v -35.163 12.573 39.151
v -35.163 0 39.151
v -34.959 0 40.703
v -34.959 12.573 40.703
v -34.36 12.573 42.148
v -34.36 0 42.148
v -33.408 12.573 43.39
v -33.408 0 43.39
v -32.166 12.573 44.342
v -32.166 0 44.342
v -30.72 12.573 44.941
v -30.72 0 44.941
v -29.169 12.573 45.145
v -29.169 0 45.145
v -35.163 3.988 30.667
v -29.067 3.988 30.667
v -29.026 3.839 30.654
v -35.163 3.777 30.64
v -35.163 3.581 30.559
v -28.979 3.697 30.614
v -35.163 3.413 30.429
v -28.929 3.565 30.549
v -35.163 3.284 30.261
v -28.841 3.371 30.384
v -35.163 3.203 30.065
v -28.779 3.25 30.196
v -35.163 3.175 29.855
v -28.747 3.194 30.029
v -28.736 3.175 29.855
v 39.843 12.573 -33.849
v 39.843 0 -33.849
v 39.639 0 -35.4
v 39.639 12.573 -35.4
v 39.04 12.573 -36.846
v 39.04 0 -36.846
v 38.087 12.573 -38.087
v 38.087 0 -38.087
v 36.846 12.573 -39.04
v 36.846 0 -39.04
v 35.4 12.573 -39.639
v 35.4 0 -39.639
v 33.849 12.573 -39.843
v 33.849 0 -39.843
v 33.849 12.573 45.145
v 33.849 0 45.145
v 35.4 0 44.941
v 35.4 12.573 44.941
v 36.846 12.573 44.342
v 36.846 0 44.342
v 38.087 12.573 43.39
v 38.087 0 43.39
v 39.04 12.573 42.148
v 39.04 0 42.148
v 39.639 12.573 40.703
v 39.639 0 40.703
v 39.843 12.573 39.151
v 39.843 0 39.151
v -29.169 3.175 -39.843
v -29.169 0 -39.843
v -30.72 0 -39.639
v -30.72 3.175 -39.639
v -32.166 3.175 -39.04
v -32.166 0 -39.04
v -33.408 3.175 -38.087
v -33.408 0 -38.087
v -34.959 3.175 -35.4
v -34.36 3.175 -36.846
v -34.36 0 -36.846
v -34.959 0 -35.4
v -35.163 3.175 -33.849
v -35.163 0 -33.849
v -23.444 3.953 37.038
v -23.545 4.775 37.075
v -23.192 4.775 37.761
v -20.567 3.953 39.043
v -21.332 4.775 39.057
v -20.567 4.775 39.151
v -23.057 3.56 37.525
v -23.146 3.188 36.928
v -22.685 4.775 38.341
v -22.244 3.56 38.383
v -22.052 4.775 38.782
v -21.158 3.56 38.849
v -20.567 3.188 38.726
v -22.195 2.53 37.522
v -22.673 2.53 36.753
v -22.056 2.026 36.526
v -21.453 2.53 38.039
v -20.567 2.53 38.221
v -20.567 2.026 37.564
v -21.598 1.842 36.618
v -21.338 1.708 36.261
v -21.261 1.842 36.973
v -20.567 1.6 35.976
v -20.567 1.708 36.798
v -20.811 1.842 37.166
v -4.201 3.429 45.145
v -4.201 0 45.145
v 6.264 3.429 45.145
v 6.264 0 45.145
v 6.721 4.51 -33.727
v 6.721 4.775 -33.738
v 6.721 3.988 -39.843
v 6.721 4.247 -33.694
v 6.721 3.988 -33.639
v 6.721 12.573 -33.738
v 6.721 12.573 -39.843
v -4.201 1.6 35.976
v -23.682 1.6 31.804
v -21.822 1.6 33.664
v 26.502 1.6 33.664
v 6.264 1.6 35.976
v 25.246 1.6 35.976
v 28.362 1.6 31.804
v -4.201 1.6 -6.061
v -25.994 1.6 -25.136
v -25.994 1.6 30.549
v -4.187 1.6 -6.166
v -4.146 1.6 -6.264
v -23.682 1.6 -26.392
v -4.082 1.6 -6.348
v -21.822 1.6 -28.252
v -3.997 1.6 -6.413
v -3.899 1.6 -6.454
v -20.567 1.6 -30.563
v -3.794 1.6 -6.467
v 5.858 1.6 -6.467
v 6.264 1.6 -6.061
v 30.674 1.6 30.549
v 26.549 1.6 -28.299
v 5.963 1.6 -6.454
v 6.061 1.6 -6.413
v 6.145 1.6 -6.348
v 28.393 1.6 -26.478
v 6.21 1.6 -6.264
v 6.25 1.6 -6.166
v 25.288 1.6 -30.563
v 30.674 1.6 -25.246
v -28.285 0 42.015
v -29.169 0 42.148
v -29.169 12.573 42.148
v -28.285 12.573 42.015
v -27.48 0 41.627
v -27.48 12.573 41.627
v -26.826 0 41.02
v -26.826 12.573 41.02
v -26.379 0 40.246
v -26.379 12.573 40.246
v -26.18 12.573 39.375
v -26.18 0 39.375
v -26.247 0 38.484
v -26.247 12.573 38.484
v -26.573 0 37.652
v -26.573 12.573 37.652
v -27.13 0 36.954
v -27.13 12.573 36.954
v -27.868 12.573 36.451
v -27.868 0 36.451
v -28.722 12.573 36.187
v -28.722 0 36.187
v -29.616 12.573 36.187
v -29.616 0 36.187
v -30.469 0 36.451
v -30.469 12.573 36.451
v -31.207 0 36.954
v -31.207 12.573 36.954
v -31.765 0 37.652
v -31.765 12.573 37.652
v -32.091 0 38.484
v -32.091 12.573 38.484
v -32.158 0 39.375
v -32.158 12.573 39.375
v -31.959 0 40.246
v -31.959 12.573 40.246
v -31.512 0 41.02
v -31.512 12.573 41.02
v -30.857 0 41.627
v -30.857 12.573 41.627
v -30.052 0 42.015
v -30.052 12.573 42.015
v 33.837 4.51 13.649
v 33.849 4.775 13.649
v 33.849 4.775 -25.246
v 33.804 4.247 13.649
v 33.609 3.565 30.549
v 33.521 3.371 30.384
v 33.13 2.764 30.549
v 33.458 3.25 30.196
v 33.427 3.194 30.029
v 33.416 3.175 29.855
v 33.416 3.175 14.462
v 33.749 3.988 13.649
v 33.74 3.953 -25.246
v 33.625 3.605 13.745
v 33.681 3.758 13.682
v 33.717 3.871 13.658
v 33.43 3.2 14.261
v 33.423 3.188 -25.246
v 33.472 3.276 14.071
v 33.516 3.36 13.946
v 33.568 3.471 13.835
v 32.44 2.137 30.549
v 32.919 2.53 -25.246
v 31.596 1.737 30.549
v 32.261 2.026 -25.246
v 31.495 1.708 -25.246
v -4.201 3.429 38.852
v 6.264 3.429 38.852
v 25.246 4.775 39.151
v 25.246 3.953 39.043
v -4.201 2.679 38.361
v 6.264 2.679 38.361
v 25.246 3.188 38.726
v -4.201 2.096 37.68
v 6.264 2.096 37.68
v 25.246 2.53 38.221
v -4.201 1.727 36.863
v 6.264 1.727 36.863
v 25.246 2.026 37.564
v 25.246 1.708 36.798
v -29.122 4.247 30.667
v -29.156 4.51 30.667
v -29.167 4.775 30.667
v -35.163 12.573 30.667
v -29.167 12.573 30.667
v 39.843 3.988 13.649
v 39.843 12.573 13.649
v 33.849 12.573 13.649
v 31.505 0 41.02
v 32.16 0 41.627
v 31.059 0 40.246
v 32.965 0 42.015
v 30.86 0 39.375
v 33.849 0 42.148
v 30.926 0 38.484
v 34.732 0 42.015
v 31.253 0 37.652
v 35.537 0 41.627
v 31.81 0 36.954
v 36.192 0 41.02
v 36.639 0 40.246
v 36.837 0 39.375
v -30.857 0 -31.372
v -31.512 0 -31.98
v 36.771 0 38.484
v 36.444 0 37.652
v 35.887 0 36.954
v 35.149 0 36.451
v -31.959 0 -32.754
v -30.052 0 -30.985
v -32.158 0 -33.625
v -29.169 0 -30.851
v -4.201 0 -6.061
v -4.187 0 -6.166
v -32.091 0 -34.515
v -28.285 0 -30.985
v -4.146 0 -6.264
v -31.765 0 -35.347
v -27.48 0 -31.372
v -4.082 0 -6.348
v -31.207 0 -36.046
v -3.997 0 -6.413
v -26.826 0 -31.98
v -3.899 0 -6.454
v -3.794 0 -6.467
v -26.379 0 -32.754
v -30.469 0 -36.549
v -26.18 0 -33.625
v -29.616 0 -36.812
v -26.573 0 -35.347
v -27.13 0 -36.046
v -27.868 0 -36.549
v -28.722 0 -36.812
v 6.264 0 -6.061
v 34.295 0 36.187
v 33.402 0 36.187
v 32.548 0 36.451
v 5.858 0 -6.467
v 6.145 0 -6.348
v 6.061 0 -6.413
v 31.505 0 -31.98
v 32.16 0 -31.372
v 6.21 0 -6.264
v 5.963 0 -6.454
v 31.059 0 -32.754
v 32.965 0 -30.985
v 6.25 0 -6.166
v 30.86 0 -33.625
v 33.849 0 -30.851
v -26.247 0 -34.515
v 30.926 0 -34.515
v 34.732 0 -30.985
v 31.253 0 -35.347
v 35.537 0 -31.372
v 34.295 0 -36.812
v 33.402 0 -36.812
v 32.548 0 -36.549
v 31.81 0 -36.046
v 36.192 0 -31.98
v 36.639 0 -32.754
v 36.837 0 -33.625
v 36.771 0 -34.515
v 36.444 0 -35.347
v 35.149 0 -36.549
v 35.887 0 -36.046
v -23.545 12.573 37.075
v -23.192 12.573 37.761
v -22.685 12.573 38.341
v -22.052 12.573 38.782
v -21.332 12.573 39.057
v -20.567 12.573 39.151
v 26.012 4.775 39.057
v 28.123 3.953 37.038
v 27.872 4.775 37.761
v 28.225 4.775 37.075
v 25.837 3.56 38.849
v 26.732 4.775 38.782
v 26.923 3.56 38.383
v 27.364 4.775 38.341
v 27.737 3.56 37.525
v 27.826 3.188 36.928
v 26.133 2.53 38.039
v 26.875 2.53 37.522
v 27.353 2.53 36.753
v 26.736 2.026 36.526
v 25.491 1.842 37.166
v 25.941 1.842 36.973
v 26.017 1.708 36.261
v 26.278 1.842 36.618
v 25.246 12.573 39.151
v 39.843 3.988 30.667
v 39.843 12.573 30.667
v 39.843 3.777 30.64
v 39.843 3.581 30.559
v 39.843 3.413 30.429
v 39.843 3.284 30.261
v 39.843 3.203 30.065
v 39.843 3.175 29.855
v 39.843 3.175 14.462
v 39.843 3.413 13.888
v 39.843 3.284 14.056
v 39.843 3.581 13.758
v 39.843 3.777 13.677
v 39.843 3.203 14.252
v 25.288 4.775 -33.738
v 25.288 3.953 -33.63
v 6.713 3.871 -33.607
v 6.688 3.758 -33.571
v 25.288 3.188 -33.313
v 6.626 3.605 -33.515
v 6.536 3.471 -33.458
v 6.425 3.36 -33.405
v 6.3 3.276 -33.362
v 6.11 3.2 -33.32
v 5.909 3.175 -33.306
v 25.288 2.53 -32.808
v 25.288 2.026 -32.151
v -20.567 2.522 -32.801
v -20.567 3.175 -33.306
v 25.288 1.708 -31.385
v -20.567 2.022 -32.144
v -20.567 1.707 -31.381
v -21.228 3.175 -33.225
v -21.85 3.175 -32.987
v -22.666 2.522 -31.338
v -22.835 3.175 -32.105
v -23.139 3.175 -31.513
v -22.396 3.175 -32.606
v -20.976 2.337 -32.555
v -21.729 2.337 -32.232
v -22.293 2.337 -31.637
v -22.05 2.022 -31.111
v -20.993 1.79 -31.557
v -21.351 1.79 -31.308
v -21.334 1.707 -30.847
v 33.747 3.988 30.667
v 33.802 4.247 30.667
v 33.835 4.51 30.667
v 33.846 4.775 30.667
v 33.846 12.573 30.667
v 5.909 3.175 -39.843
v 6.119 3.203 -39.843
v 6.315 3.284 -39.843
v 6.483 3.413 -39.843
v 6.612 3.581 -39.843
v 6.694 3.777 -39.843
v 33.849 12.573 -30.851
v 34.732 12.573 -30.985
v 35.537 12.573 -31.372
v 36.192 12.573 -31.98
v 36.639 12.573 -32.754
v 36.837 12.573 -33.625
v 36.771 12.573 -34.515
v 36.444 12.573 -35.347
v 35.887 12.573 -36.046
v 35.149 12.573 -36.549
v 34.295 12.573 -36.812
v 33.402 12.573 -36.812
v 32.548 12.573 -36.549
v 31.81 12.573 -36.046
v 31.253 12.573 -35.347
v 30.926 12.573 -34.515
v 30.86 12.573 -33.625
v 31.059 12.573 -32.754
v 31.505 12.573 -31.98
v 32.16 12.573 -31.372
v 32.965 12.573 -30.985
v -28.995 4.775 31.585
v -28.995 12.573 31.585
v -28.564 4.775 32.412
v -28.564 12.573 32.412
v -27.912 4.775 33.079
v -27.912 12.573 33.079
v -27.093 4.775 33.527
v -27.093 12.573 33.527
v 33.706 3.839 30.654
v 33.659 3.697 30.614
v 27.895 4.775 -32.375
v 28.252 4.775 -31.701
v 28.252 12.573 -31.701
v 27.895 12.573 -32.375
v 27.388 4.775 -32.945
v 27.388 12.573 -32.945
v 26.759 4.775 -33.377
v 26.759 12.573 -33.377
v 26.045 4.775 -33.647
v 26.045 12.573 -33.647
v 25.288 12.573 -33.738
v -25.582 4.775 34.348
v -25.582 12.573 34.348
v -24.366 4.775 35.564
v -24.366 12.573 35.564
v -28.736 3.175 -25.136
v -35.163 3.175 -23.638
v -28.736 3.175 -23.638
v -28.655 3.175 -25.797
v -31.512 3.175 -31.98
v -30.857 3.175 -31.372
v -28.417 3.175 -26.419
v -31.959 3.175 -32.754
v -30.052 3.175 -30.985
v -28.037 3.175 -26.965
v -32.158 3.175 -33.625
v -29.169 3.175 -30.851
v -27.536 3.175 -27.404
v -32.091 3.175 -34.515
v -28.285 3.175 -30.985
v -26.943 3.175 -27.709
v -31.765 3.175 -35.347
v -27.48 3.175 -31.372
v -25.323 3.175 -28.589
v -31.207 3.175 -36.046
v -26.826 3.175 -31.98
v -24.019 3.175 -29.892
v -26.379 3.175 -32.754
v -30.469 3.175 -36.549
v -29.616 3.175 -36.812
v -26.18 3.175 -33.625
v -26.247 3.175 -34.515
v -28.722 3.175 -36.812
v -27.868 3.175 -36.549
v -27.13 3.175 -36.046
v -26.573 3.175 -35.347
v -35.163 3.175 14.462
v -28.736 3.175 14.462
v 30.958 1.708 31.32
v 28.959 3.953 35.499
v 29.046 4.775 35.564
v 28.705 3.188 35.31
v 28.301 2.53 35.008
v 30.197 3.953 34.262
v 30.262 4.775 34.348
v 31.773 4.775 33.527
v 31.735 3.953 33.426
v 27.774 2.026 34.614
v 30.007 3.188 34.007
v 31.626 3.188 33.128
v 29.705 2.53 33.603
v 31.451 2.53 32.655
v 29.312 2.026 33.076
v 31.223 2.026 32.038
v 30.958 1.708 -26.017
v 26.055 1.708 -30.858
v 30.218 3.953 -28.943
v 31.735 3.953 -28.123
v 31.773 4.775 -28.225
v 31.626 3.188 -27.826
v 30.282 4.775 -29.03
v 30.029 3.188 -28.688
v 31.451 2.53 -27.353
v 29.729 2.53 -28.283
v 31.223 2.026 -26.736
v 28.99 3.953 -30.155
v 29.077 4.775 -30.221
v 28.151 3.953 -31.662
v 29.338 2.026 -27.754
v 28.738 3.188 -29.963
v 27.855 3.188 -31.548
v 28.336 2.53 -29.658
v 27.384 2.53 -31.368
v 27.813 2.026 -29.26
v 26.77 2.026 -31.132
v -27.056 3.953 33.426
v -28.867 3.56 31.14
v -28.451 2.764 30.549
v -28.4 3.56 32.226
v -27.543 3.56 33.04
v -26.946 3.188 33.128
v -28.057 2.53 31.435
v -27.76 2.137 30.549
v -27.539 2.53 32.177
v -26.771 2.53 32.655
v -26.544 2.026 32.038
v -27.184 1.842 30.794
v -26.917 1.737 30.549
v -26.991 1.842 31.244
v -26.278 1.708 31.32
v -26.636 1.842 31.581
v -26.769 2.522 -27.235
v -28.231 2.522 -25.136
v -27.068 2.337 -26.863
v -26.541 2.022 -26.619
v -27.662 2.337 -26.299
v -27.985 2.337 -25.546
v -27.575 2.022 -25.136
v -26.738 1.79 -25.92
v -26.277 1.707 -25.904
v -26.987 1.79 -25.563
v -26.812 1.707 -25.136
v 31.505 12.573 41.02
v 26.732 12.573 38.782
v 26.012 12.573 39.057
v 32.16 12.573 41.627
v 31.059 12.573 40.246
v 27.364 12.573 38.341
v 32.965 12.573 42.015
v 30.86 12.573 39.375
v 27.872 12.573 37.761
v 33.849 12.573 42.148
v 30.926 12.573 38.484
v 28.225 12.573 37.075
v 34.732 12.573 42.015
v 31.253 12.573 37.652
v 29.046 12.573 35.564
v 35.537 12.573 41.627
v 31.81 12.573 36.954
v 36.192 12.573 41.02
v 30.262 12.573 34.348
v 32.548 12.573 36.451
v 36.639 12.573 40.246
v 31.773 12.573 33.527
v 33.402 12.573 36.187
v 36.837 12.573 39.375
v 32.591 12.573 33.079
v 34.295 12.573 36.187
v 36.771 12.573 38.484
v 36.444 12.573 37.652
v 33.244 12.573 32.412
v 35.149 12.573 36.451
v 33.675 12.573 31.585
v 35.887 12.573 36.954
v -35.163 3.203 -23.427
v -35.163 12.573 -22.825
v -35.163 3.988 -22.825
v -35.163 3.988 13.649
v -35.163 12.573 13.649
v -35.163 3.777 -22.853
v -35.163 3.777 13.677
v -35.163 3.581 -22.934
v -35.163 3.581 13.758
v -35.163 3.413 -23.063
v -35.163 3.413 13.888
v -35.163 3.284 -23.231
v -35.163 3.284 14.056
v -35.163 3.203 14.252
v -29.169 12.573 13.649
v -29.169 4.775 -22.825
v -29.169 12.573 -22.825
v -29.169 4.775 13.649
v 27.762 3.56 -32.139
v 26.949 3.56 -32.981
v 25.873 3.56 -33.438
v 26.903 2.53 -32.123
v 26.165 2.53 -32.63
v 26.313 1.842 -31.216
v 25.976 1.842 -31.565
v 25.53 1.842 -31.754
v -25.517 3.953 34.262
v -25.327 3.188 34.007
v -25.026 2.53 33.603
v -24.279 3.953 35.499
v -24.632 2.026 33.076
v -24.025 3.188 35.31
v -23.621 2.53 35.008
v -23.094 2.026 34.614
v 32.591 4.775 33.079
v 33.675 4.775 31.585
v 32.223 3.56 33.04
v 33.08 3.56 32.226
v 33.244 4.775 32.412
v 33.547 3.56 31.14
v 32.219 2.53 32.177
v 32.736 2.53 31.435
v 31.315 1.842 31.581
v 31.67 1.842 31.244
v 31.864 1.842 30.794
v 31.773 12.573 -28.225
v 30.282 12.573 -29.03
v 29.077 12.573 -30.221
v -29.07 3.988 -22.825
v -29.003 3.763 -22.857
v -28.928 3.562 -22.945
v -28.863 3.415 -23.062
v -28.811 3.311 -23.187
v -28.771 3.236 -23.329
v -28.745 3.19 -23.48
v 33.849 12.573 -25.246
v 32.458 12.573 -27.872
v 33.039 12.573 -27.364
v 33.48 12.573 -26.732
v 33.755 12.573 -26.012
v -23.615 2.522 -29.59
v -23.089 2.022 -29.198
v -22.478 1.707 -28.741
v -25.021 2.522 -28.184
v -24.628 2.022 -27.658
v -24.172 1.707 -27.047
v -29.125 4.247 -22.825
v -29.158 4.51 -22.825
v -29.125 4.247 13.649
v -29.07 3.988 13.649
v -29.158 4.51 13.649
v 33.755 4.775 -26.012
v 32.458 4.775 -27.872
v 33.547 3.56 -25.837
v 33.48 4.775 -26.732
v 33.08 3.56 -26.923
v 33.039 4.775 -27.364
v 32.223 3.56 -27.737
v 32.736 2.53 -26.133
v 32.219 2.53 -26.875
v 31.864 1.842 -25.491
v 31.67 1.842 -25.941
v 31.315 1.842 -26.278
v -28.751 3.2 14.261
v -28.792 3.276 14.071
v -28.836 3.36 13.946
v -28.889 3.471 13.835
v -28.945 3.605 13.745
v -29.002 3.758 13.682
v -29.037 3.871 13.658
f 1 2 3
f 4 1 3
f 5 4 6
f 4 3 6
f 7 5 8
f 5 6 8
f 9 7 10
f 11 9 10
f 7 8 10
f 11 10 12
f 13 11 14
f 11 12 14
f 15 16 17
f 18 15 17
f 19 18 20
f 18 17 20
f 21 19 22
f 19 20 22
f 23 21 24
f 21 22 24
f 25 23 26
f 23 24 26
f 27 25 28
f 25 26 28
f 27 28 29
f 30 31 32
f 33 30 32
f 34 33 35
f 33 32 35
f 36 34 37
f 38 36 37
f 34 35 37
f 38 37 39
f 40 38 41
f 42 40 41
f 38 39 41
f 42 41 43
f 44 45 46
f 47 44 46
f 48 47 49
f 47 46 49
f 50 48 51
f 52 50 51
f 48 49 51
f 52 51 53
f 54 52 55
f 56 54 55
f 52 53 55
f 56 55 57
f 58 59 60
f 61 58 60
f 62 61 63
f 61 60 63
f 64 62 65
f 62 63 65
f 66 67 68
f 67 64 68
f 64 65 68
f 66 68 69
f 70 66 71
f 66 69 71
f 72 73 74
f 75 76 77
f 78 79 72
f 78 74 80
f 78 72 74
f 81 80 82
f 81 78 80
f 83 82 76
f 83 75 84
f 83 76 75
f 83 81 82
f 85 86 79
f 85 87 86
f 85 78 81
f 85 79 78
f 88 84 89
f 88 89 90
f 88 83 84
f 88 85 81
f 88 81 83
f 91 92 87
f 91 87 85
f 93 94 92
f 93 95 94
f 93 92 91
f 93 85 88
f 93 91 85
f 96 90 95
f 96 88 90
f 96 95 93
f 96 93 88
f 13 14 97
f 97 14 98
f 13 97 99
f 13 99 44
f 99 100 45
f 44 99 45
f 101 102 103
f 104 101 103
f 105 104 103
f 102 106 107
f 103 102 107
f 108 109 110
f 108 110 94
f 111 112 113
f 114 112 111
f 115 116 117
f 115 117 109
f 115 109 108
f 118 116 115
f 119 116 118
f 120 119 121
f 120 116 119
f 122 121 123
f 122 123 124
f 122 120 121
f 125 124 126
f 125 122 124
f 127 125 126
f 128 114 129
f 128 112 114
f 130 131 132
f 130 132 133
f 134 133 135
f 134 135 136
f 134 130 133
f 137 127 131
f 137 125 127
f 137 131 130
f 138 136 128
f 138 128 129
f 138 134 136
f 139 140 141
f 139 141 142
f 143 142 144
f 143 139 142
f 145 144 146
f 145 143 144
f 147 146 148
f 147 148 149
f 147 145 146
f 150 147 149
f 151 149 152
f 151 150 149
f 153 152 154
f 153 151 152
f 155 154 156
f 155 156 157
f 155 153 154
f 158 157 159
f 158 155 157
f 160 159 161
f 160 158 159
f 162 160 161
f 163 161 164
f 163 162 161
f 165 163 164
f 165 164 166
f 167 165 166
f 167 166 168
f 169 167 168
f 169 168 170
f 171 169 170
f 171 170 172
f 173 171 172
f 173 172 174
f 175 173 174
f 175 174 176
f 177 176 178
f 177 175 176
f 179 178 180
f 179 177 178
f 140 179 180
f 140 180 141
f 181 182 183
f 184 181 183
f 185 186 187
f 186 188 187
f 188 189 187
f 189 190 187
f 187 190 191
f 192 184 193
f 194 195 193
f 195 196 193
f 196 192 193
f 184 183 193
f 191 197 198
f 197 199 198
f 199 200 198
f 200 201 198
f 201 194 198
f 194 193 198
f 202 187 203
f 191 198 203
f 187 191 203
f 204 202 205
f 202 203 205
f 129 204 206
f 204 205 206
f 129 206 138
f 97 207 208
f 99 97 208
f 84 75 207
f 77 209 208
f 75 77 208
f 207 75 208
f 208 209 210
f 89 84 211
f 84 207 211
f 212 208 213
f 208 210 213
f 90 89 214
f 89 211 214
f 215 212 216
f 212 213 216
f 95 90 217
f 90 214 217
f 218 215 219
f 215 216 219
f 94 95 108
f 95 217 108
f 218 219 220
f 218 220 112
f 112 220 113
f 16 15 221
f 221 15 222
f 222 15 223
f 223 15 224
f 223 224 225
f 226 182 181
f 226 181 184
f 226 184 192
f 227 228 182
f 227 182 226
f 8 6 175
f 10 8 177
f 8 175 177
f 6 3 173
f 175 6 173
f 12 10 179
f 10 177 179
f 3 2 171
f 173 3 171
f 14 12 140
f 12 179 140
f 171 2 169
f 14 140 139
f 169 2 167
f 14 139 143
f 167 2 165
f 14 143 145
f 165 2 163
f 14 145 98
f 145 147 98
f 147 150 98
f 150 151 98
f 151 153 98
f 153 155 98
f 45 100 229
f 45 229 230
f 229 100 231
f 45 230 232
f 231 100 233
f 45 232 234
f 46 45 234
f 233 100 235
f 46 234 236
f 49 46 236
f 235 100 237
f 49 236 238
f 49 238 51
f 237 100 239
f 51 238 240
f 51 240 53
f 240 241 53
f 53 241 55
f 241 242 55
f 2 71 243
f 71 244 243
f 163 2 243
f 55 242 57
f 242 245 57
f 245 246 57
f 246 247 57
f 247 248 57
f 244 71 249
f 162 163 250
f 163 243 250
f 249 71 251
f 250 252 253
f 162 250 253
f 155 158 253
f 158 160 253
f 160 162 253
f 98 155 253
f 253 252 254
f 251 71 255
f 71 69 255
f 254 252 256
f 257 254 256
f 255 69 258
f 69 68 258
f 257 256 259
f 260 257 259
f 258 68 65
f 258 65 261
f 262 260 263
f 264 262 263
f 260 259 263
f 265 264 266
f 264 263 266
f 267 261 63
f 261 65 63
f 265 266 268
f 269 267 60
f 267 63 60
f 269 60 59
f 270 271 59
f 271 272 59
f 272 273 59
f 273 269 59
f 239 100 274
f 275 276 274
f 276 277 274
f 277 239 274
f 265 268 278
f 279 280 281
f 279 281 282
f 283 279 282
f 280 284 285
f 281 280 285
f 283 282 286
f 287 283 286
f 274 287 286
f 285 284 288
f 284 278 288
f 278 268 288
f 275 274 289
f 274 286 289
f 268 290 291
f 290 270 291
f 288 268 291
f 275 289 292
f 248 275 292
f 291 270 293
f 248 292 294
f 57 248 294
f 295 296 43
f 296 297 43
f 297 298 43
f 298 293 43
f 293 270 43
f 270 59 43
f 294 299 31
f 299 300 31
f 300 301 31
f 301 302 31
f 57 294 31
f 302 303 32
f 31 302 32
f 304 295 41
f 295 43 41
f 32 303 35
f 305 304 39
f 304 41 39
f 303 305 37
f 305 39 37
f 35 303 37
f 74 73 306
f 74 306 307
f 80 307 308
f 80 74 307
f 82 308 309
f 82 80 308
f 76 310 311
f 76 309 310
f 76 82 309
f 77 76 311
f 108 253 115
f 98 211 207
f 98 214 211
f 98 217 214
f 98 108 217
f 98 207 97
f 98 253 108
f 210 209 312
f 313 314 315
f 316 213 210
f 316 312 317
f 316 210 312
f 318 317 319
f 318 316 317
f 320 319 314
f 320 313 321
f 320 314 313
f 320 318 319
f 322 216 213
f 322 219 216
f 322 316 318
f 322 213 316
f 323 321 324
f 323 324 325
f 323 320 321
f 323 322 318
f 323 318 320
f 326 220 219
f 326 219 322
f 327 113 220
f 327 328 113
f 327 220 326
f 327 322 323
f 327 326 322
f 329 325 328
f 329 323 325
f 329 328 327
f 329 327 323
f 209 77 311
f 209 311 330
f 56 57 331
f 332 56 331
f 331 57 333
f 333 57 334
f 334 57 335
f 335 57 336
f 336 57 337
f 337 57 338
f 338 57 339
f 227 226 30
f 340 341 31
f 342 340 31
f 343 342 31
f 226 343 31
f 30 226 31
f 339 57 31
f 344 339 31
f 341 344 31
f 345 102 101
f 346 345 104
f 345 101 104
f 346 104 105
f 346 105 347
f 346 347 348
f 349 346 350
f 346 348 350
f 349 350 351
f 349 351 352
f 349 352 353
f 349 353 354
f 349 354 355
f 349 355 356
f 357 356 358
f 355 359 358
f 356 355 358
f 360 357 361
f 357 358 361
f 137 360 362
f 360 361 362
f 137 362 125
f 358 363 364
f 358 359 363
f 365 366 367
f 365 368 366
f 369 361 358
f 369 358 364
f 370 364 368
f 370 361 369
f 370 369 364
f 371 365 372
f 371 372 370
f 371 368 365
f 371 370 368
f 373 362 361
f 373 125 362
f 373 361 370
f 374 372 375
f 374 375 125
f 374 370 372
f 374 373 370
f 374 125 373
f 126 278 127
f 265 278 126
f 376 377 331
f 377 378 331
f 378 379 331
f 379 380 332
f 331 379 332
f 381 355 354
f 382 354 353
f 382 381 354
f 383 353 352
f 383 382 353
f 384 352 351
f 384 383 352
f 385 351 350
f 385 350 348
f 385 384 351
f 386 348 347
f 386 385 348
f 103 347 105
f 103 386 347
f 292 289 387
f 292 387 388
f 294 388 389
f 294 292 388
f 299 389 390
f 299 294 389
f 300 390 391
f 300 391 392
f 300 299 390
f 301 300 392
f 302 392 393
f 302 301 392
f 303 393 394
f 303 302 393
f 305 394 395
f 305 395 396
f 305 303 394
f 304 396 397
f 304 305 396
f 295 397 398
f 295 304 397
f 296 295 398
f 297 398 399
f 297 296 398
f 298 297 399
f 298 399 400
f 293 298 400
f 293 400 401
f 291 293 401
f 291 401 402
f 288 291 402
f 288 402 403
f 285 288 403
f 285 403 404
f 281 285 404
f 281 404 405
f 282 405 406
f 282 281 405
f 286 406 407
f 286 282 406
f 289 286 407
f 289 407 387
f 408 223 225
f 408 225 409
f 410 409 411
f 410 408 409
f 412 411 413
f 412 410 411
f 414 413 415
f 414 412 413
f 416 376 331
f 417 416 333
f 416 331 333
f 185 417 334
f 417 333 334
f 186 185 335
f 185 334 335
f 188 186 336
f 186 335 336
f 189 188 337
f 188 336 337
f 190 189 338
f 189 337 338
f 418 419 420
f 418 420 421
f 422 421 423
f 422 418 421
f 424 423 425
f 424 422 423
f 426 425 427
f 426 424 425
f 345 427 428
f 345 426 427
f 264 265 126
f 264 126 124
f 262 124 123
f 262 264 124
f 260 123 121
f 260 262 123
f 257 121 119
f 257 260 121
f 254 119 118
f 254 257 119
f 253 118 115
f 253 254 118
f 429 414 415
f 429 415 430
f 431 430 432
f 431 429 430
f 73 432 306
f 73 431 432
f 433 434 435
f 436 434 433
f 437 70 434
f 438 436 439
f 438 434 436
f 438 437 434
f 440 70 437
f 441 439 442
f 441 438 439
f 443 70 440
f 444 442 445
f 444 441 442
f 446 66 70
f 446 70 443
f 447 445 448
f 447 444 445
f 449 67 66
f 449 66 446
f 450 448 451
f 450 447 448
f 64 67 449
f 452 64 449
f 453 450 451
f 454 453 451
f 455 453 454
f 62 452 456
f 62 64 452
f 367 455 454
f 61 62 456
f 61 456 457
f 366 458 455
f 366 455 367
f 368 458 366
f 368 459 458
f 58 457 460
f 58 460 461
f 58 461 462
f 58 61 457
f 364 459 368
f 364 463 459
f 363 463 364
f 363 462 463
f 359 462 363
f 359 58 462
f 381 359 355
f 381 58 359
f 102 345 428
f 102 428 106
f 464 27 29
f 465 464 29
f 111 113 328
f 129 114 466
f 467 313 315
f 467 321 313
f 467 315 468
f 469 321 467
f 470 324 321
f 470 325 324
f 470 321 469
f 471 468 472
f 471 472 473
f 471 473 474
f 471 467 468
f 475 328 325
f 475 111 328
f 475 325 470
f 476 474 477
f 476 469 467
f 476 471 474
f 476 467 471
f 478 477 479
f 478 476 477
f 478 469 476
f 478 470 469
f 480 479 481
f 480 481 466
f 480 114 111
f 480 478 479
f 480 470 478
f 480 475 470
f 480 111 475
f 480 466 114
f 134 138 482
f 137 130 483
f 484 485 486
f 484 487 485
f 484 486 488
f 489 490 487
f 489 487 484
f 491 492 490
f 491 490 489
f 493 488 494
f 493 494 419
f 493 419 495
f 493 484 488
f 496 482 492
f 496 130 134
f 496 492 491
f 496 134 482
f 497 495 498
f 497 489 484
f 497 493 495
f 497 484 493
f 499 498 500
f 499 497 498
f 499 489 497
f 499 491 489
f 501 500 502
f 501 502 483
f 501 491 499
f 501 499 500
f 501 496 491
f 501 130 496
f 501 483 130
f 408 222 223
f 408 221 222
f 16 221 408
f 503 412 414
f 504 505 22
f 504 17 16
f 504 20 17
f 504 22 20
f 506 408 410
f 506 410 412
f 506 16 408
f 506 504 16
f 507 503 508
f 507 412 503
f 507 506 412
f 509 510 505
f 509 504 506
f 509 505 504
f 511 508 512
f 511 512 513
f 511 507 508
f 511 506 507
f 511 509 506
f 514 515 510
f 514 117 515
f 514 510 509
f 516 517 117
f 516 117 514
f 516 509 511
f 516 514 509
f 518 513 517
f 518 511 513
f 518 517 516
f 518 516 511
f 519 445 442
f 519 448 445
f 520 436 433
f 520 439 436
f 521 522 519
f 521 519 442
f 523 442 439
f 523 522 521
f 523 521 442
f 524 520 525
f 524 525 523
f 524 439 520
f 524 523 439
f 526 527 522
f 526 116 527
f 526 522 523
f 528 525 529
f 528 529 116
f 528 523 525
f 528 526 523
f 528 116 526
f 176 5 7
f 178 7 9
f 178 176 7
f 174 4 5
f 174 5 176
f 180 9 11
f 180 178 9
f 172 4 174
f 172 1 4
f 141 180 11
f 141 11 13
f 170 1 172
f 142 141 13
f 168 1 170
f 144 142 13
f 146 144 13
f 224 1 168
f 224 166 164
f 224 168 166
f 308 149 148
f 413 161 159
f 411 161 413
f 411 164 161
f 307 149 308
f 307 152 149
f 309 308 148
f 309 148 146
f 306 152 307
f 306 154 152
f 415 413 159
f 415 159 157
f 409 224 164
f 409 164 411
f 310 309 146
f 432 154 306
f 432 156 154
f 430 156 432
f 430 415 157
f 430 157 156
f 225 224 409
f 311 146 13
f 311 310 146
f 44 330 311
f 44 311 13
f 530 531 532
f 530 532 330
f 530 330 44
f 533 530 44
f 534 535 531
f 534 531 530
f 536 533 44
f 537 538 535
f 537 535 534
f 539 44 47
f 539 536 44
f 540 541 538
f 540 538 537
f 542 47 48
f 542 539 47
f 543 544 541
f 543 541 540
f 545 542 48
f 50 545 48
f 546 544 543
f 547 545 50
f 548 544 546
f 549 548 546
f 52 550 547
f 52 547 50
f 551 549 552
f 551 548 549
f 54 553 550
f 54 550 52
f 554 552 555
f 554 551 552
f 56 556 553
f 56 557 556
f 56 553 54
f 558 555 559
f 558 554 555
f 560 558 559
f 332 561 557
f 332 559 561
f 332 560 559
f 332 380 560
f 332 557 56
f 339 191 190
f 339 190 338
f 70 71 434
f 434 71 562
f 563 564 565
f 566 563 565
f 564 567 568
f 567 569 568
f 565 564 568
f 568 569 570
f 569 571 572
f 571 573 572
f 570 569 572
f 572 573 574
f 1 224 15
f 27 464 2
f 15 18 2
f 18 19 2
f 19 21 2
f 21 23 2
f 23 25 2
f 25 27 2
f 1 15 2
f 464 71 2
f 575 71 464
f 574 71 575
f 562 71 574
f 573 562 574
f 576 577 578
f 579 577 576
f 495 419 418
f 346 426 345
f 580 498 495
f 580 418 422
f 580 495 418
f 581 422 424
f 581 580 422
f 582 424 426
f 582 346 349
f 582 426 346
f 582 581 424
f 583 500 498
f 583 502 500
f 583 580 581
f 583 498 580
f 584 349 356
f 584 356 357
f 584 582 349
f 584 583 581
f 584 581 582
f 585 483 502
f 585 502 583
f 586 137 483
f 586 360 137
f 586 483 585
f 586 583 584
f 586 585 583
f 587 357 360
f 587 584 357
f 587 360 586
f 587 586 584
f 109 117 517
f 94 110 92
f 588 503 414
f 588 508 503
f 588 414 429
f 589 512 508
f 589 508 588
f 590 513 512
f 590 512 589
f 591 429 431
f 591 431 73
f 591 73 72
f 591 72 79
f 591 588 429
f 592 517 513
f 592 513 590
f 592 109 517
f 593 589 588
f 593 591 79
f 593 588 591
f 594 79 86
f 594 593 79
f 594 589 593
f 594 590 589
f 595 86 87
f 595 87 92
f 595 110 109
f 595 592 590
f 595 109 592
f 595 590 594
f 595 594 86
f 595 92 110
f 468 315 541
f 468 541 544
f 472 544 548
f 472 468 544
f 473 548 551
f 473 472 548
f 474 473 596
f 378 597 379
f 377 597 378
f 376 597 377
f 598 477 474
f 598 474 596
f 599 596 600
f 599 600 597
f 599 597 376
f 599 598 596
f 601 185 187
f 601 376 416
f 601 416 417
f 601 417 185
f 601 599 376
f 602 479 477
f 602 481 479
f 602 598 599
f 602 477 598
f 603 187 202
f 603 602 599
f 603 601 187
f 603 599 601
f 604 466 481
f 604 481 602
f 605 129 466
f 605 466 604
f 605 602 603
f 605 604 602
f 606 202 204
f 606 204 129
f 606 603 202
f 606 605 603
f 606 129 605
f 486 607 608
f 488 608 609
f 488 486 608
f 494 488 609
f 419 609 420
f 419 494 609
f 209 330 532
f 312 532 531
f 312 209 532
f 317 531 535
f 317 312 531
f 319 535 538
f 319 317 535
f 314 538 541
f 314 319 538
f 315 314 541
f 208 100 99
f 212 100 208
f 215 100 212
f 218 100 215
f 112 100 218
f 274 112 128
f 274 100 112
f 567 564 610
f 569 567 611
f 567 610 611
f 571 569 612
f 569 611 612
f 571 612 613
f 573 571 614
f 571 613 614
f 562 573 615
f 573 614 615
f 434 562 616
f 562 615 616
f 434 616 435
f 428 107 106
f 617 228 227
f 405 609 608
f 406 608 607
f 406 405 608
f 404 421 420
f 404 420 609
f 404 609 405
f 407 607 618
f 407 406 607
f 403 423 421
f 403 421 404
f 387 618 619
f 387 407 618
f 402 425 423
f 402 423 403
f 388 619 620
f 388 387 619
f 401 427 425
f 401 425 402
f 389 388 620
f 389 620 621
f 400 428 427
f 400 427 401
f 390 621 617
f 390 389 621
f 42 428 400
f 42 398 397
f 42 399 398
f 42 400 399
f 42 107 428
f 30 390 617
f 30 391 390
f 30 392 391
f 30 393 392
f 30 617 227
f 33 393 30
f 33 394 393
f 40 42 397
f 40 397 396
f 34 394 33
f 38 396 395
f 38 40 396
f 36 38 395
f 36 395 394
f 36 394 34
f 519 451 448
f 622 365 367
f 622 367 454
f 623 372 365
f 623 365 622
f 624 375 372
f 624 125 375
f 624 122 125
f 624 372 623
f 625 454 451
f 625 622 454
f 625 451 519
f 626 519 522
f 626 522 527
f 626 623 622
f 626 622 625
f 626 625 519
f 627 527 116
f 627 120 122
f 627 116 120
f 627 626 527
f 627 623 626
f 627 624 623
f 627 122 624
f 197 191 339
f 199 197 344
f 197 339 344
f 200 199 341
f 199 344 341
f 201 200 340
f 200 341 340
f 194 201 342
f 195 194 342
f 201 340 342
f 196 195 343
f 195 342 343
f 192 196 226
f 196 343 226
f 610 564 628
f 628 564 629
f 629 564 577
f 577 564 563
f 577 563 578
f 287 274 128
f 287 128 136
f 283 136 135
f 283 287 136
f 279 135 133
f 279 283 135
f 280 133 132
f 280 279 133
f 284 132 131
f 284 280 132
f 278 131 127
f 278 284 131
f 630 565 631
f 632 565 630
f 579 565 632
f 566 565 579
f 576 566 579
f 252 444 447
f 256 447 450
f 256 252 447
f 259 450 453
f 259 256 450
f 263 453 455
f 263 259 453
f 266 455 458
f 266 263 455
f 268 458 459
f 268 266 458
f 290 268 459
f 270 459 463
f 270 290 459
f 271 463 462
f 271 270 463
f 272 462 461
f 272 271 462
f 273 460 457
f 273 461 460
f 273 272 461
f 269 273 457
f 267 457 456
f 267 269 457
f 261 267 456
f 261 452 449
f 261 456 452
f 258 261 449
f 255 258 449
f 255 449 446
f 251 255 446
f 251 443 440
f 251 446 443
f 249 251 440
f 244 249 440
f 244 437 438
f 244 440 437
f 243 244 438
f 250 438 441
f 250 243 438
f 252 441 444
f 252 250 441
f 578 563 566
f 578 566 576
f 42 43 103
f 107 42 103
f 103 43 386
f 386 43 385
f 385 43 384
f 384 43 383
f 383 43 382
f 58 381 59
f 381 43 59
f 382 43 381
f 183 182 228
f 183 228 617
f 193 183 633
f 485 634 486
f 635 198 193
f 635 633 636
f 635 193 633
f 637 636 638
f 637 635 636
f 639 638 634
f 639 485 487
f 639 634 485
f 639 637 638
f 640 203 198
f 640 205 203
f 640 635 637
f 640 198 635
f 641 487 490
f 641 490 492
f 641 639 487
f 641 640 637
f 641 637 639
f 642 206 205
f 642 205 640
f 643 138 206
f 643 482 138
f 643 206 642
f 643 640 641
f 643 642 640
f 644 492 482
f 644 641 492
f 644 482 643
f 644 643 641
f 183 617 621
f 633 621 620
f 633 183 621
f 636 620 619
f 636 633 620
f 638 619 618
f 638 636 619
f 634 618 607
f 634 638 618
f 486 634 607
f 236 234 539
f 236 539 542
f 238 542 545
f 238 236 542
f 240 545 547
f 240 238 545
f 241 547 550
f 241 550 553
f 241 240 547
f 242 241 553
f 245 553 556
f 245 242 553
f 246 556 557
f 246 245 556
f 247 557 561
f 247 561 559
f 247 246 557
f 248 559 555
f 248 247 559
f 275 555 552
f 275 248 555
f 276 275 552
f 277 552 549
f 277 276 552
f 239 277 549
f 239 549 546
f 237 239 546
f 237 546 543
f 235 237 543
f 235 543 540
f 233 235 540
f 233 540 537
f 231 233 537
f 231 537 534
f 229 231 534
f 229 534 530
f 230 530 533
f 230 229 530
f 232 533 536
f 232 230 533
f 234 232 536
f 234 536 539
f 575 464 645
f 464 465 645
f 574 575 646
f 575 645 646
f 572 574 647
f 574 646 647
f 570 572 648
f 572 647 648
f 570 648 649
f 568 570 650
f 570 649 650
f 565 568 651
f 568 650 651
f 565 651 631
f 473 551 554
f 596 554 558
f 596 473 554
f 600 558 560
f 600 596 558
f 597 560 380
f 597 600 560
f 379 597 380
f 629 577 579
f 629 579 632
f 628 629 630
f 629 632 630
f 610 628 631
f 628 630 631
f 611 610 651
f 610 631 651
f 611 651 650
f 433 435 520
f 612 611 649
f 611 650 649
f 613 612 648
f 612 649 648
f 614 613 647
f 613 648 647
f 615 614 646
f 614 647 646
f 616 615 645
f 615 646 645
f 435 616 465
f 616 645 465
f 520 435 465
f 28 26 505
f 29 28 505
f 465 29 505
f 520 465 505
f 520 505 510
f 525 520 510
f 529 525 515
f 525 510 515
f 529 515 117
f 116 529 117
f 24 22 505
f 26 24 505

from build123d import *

# Parameters (mm, degrees)
SKETCH1_R               = 2.9972
BOSS_EXTRUDE1_DEPTH     = 12.573
CUT_EXTRUDE3_DEPTH      = 62.511402554
CUT_EXTRUDE3_DEPTH_BACK = 10.9728
FILLET1_R               = 3.175
CUT_EXTRUDE1_DEPTH      = 3.429
CUT_EXTRUDE1_DEPTH_BACK = 62.511402554
SKETCH6_W               = 75.0062
SKETCH6_H               = 17.018
SKETCH6_W_2             = 41.8846
CUT_EXTRUDE4_DEPTH      = 9.398
FILLET2_R               = 0.8128


with BuildPart() as part:
    # Sketch1 → Boss-Extrude1 (new body)
    with BuildSketch(Plane(origin=(0, 0, 0), x_dir=(1, 0, 0), z_dir=(0, 1, 0))):
        with BuildLine():
            Line((-29.1688495, -45.1454495), (33.8485505, -45.1454495))
            ThreePointArc((33.8485505, -45.1454495), (38.087231389, -43.389730389), (39.8429505, -39.1510495))
            Line((39.8429505, -39.1510495), (39.8429505, 33.8485505))
            ThreePointArc((39.8429505, 33.8485505), (38.087231389, 38.087231389), (33.8485505, 39.8429505))
            Line((33.8485505, 39.8429505), (-29.1688495, 39.8429505))
            ThreePointArc((-29.1688495, 39.8429505), (-33.407530389, 38.087231389), (-35.1632495, 33.8485505))
            Line((-35.1632495, 33.8485505), (-35.1632495, -39.1510495))
            ThreePointArc((-35.1632495, -39.1510495), (-33.407530389, -43.389730389), (-29.1688495, -45.1454495))
        make_face()
        with Locations(Location((-29.1688495, 33.8485505, 0), (0, 0, 270))):
            Circle(SKETCH1_R, mode=Mode.SUBTRACT)
        with Locations(Location((33.8485505, 33.8485505, 0), (0, 0, 270))):
            Circle(SKETCH1_R, mode=Mode.SUBTRACT)
        with Locations(Location((33.8485505, -39.1510495, 0), (0, 0, 270))):
            Circle(SKETCH1_R, mode=Mode.SUBTRACT)
        with Locations(Location((-29.1688495, -39.1510495, 0), (0, 0, 270))):
            Circle(SKETCH1_R, mode=Mode.SUBTRACT)
    extrude(amount=BOSS_EXTRUDE1_DEPTH)

    # Sketch5 → Cut-Extrude3 (cut, two sides: drawn at the far end of the back side and taken through both)
    with BuildSketch(Plane(origin=(0, 12.573, 0), x_dir=(1, 0, 0), z_dir=(0, 1, 0)).offset(-CUT_EXTRUDE3_DEPTH_BACK)):
        with BuildLine():
            Line((-20.566682833, -39.1510495), (25.246383833, -39.1510495))
            ThreePointArc((25.246383833, -39.1510495), (27.061611626, -38.580962754), (28.224973399, -37.075426231))
            ThreePointArc((28.224973399, -37.075426231), (29.609869611, -34.912368611), (31.772927231, -33.527472399))
            ThreePointArc((31.772927231, -33.527472399), (33.278463754, -32.364110626), (33.8485505, -30.548882833))
            Line((33.8485505, -30.548882833), (33.8485505, 25.246383833))
            ThreePointArc((33.8485505, 25.246383833), (33.278463754, 27.061611626), (31.772927231, 28.224973399))
            ThreePointArc((31.772927231, 28.224973399), (29.637195811, 29.582718454), (28.25211412, 31.700823514))
            ThreePointArc((28.25211412, 31.700823514), (27.086350512, 33.179780767), (25.287899936, 33.738256255))
            Line((25.287899936, 33.738256255), (-20.566682833, 33.738256255))
            ThreePointArc((-20.566682833, 33.738256255), (-22.381910626, 33.168169509), (-23.545272399, 31.662632986))
            ThreePointArc((-23.545272399, 31.662632986), (-24.930168611, 29.499575366), (-27.093226231, 28.114679154))
            ThreePointArc((-27.093226231, 28.114679154), (-28.598762754, 26.951317381), (-29.1688495, 25.136089588))
            Line((-29.1688495, 25.136089588), (-29.1688495, -30.548882833))
            ThreePointArc((-29.1688495, -30.548882833), (-28.598762754, -32.364110626), (-27.093226231, -33.527472399))
            ThreePointArc((-27.093226231, -33.527472399), (-24.930168611, -34.912368611), (-23.545272399, -37.075426231))
            ThreePointArc((-23.545272399, -37.075426231), (-22.381910626, -38.580962754), (-20.566682833, -39.1510495))
        make_face()
    extrude(amount=CUT_EXTRUDE3_DEPTH + CUT_EXTRUDE3_DEPTH_BACK, mode=Mode.SUBTRACT)

    # Fillet1
    fillet1_edges = [part.edges().sort_by_distance(p)[0] for p in [
        (-22.381910626, 1.6002, -33.168169509),
        (-24.930168611, 1.6002, -29.499575366),
        (-28.598762754, 1.6002, -26.951317381),
        (-29.1688495, 1.6002, 2.706396623),
        (2.3398505, 1.6002, 39.1510495),
        (27.061611626, 1.6002, 38.580962754),
        (29.609869611, 1.6002, 34.912368611),
        (33.278463754, 1.6002, 32.364110626),
        (33.8485505, 1.6002, 2.6512495),
        (33.278463754, 1.6002, -27.061611626),
        (29.637195811, 1.6002, -29.582718454),
        (27.086350512, 1.6002, -33.179780767),
        (2.360608551, 1.6002, -33.738256255),
        (-28.598762754, 1.6002, 32.364110626),
        (-24.930168611, 1.6002, 34.912368611),
        (-22.381910626, 1.6002, 38.580962754),
    ]]
    fillet(fillet1_edges, radius=FILLET1_R)

    # Sketch2 → Cut-Extrude1 (cut, two sides: drawn at the far end of the back side and taken through both)
    with BuildSketch(Plane(origin=(0, 0, 0), x_dir=(1, 0, 0), z_dir=(0, 1, 0)).offset(-CUT_EXTRUDE1_DEPTH_BACK)):
        with BuildLine():
            Line((-4.2006495, -45.1454495), (6.2641505, -45.1454495))
            Line((6.2641505, -45.1454495), (6.2641505, 6.0609505))
            ThreePointArc((6.2641505, 6.0609505), (6.145118696, 6.348318696), (5.8577505, 6.4673505))
            Line((5.8577505, 6.4673505), (-3.7942495, 6.4673505))
            ThreePointArc((-3.7942495, 6.4673505), (-4.081617696, 6.348318696), (-4.2006495, 6.0609505))
            Line((-4.2006495, 6.0609505), (-4.2006495, -45.1454495))
        make_face()
    extrude(amount=CUT_EXTRUDE1_DEPTH + CUT_EXTRUDE1_DEPTH_BACK, mode=Mode.SUBTRACT)

    # Sketch6 → Cut-Extrude4 (cut)
    with BuildSketch(Plane(origin=(0, 12.573, 0), x_dir=(1, 0, 0), z_dir=(0, 1, 0))):
        with Locations((2.3398505, -22.1584495)):
            Rectangle(SKETCH6_W, SKETCH6_H)
        with Locations((-14.2209495, 31.3339505)):
            Rectangle(SKETCH6_W_2, SKETCH6_H)
    extrude(amount=-CUT_EXTRUDE4_DEPTH, mode=Mode.SUBTRACT)

    # Fillet2
    fillet2_edges = [part.edges().sort_by_distance(p)[0] for p in [
        (36.629380049, 3.175, 13.6494495),
        (36.628097837, 3.175, 30.6674495),
        (-31.948396837, 3.175, 30.6674495),
        (-31.949679049, 3.175, 13.6494495),
        (-31.949679049, 3.175, -22.8249505),
        (6.7213505, 3.175, -36.574232926),
    ]]
    fillet(fillet2_edges, radius=FILLET2_R)


solid = part.part
